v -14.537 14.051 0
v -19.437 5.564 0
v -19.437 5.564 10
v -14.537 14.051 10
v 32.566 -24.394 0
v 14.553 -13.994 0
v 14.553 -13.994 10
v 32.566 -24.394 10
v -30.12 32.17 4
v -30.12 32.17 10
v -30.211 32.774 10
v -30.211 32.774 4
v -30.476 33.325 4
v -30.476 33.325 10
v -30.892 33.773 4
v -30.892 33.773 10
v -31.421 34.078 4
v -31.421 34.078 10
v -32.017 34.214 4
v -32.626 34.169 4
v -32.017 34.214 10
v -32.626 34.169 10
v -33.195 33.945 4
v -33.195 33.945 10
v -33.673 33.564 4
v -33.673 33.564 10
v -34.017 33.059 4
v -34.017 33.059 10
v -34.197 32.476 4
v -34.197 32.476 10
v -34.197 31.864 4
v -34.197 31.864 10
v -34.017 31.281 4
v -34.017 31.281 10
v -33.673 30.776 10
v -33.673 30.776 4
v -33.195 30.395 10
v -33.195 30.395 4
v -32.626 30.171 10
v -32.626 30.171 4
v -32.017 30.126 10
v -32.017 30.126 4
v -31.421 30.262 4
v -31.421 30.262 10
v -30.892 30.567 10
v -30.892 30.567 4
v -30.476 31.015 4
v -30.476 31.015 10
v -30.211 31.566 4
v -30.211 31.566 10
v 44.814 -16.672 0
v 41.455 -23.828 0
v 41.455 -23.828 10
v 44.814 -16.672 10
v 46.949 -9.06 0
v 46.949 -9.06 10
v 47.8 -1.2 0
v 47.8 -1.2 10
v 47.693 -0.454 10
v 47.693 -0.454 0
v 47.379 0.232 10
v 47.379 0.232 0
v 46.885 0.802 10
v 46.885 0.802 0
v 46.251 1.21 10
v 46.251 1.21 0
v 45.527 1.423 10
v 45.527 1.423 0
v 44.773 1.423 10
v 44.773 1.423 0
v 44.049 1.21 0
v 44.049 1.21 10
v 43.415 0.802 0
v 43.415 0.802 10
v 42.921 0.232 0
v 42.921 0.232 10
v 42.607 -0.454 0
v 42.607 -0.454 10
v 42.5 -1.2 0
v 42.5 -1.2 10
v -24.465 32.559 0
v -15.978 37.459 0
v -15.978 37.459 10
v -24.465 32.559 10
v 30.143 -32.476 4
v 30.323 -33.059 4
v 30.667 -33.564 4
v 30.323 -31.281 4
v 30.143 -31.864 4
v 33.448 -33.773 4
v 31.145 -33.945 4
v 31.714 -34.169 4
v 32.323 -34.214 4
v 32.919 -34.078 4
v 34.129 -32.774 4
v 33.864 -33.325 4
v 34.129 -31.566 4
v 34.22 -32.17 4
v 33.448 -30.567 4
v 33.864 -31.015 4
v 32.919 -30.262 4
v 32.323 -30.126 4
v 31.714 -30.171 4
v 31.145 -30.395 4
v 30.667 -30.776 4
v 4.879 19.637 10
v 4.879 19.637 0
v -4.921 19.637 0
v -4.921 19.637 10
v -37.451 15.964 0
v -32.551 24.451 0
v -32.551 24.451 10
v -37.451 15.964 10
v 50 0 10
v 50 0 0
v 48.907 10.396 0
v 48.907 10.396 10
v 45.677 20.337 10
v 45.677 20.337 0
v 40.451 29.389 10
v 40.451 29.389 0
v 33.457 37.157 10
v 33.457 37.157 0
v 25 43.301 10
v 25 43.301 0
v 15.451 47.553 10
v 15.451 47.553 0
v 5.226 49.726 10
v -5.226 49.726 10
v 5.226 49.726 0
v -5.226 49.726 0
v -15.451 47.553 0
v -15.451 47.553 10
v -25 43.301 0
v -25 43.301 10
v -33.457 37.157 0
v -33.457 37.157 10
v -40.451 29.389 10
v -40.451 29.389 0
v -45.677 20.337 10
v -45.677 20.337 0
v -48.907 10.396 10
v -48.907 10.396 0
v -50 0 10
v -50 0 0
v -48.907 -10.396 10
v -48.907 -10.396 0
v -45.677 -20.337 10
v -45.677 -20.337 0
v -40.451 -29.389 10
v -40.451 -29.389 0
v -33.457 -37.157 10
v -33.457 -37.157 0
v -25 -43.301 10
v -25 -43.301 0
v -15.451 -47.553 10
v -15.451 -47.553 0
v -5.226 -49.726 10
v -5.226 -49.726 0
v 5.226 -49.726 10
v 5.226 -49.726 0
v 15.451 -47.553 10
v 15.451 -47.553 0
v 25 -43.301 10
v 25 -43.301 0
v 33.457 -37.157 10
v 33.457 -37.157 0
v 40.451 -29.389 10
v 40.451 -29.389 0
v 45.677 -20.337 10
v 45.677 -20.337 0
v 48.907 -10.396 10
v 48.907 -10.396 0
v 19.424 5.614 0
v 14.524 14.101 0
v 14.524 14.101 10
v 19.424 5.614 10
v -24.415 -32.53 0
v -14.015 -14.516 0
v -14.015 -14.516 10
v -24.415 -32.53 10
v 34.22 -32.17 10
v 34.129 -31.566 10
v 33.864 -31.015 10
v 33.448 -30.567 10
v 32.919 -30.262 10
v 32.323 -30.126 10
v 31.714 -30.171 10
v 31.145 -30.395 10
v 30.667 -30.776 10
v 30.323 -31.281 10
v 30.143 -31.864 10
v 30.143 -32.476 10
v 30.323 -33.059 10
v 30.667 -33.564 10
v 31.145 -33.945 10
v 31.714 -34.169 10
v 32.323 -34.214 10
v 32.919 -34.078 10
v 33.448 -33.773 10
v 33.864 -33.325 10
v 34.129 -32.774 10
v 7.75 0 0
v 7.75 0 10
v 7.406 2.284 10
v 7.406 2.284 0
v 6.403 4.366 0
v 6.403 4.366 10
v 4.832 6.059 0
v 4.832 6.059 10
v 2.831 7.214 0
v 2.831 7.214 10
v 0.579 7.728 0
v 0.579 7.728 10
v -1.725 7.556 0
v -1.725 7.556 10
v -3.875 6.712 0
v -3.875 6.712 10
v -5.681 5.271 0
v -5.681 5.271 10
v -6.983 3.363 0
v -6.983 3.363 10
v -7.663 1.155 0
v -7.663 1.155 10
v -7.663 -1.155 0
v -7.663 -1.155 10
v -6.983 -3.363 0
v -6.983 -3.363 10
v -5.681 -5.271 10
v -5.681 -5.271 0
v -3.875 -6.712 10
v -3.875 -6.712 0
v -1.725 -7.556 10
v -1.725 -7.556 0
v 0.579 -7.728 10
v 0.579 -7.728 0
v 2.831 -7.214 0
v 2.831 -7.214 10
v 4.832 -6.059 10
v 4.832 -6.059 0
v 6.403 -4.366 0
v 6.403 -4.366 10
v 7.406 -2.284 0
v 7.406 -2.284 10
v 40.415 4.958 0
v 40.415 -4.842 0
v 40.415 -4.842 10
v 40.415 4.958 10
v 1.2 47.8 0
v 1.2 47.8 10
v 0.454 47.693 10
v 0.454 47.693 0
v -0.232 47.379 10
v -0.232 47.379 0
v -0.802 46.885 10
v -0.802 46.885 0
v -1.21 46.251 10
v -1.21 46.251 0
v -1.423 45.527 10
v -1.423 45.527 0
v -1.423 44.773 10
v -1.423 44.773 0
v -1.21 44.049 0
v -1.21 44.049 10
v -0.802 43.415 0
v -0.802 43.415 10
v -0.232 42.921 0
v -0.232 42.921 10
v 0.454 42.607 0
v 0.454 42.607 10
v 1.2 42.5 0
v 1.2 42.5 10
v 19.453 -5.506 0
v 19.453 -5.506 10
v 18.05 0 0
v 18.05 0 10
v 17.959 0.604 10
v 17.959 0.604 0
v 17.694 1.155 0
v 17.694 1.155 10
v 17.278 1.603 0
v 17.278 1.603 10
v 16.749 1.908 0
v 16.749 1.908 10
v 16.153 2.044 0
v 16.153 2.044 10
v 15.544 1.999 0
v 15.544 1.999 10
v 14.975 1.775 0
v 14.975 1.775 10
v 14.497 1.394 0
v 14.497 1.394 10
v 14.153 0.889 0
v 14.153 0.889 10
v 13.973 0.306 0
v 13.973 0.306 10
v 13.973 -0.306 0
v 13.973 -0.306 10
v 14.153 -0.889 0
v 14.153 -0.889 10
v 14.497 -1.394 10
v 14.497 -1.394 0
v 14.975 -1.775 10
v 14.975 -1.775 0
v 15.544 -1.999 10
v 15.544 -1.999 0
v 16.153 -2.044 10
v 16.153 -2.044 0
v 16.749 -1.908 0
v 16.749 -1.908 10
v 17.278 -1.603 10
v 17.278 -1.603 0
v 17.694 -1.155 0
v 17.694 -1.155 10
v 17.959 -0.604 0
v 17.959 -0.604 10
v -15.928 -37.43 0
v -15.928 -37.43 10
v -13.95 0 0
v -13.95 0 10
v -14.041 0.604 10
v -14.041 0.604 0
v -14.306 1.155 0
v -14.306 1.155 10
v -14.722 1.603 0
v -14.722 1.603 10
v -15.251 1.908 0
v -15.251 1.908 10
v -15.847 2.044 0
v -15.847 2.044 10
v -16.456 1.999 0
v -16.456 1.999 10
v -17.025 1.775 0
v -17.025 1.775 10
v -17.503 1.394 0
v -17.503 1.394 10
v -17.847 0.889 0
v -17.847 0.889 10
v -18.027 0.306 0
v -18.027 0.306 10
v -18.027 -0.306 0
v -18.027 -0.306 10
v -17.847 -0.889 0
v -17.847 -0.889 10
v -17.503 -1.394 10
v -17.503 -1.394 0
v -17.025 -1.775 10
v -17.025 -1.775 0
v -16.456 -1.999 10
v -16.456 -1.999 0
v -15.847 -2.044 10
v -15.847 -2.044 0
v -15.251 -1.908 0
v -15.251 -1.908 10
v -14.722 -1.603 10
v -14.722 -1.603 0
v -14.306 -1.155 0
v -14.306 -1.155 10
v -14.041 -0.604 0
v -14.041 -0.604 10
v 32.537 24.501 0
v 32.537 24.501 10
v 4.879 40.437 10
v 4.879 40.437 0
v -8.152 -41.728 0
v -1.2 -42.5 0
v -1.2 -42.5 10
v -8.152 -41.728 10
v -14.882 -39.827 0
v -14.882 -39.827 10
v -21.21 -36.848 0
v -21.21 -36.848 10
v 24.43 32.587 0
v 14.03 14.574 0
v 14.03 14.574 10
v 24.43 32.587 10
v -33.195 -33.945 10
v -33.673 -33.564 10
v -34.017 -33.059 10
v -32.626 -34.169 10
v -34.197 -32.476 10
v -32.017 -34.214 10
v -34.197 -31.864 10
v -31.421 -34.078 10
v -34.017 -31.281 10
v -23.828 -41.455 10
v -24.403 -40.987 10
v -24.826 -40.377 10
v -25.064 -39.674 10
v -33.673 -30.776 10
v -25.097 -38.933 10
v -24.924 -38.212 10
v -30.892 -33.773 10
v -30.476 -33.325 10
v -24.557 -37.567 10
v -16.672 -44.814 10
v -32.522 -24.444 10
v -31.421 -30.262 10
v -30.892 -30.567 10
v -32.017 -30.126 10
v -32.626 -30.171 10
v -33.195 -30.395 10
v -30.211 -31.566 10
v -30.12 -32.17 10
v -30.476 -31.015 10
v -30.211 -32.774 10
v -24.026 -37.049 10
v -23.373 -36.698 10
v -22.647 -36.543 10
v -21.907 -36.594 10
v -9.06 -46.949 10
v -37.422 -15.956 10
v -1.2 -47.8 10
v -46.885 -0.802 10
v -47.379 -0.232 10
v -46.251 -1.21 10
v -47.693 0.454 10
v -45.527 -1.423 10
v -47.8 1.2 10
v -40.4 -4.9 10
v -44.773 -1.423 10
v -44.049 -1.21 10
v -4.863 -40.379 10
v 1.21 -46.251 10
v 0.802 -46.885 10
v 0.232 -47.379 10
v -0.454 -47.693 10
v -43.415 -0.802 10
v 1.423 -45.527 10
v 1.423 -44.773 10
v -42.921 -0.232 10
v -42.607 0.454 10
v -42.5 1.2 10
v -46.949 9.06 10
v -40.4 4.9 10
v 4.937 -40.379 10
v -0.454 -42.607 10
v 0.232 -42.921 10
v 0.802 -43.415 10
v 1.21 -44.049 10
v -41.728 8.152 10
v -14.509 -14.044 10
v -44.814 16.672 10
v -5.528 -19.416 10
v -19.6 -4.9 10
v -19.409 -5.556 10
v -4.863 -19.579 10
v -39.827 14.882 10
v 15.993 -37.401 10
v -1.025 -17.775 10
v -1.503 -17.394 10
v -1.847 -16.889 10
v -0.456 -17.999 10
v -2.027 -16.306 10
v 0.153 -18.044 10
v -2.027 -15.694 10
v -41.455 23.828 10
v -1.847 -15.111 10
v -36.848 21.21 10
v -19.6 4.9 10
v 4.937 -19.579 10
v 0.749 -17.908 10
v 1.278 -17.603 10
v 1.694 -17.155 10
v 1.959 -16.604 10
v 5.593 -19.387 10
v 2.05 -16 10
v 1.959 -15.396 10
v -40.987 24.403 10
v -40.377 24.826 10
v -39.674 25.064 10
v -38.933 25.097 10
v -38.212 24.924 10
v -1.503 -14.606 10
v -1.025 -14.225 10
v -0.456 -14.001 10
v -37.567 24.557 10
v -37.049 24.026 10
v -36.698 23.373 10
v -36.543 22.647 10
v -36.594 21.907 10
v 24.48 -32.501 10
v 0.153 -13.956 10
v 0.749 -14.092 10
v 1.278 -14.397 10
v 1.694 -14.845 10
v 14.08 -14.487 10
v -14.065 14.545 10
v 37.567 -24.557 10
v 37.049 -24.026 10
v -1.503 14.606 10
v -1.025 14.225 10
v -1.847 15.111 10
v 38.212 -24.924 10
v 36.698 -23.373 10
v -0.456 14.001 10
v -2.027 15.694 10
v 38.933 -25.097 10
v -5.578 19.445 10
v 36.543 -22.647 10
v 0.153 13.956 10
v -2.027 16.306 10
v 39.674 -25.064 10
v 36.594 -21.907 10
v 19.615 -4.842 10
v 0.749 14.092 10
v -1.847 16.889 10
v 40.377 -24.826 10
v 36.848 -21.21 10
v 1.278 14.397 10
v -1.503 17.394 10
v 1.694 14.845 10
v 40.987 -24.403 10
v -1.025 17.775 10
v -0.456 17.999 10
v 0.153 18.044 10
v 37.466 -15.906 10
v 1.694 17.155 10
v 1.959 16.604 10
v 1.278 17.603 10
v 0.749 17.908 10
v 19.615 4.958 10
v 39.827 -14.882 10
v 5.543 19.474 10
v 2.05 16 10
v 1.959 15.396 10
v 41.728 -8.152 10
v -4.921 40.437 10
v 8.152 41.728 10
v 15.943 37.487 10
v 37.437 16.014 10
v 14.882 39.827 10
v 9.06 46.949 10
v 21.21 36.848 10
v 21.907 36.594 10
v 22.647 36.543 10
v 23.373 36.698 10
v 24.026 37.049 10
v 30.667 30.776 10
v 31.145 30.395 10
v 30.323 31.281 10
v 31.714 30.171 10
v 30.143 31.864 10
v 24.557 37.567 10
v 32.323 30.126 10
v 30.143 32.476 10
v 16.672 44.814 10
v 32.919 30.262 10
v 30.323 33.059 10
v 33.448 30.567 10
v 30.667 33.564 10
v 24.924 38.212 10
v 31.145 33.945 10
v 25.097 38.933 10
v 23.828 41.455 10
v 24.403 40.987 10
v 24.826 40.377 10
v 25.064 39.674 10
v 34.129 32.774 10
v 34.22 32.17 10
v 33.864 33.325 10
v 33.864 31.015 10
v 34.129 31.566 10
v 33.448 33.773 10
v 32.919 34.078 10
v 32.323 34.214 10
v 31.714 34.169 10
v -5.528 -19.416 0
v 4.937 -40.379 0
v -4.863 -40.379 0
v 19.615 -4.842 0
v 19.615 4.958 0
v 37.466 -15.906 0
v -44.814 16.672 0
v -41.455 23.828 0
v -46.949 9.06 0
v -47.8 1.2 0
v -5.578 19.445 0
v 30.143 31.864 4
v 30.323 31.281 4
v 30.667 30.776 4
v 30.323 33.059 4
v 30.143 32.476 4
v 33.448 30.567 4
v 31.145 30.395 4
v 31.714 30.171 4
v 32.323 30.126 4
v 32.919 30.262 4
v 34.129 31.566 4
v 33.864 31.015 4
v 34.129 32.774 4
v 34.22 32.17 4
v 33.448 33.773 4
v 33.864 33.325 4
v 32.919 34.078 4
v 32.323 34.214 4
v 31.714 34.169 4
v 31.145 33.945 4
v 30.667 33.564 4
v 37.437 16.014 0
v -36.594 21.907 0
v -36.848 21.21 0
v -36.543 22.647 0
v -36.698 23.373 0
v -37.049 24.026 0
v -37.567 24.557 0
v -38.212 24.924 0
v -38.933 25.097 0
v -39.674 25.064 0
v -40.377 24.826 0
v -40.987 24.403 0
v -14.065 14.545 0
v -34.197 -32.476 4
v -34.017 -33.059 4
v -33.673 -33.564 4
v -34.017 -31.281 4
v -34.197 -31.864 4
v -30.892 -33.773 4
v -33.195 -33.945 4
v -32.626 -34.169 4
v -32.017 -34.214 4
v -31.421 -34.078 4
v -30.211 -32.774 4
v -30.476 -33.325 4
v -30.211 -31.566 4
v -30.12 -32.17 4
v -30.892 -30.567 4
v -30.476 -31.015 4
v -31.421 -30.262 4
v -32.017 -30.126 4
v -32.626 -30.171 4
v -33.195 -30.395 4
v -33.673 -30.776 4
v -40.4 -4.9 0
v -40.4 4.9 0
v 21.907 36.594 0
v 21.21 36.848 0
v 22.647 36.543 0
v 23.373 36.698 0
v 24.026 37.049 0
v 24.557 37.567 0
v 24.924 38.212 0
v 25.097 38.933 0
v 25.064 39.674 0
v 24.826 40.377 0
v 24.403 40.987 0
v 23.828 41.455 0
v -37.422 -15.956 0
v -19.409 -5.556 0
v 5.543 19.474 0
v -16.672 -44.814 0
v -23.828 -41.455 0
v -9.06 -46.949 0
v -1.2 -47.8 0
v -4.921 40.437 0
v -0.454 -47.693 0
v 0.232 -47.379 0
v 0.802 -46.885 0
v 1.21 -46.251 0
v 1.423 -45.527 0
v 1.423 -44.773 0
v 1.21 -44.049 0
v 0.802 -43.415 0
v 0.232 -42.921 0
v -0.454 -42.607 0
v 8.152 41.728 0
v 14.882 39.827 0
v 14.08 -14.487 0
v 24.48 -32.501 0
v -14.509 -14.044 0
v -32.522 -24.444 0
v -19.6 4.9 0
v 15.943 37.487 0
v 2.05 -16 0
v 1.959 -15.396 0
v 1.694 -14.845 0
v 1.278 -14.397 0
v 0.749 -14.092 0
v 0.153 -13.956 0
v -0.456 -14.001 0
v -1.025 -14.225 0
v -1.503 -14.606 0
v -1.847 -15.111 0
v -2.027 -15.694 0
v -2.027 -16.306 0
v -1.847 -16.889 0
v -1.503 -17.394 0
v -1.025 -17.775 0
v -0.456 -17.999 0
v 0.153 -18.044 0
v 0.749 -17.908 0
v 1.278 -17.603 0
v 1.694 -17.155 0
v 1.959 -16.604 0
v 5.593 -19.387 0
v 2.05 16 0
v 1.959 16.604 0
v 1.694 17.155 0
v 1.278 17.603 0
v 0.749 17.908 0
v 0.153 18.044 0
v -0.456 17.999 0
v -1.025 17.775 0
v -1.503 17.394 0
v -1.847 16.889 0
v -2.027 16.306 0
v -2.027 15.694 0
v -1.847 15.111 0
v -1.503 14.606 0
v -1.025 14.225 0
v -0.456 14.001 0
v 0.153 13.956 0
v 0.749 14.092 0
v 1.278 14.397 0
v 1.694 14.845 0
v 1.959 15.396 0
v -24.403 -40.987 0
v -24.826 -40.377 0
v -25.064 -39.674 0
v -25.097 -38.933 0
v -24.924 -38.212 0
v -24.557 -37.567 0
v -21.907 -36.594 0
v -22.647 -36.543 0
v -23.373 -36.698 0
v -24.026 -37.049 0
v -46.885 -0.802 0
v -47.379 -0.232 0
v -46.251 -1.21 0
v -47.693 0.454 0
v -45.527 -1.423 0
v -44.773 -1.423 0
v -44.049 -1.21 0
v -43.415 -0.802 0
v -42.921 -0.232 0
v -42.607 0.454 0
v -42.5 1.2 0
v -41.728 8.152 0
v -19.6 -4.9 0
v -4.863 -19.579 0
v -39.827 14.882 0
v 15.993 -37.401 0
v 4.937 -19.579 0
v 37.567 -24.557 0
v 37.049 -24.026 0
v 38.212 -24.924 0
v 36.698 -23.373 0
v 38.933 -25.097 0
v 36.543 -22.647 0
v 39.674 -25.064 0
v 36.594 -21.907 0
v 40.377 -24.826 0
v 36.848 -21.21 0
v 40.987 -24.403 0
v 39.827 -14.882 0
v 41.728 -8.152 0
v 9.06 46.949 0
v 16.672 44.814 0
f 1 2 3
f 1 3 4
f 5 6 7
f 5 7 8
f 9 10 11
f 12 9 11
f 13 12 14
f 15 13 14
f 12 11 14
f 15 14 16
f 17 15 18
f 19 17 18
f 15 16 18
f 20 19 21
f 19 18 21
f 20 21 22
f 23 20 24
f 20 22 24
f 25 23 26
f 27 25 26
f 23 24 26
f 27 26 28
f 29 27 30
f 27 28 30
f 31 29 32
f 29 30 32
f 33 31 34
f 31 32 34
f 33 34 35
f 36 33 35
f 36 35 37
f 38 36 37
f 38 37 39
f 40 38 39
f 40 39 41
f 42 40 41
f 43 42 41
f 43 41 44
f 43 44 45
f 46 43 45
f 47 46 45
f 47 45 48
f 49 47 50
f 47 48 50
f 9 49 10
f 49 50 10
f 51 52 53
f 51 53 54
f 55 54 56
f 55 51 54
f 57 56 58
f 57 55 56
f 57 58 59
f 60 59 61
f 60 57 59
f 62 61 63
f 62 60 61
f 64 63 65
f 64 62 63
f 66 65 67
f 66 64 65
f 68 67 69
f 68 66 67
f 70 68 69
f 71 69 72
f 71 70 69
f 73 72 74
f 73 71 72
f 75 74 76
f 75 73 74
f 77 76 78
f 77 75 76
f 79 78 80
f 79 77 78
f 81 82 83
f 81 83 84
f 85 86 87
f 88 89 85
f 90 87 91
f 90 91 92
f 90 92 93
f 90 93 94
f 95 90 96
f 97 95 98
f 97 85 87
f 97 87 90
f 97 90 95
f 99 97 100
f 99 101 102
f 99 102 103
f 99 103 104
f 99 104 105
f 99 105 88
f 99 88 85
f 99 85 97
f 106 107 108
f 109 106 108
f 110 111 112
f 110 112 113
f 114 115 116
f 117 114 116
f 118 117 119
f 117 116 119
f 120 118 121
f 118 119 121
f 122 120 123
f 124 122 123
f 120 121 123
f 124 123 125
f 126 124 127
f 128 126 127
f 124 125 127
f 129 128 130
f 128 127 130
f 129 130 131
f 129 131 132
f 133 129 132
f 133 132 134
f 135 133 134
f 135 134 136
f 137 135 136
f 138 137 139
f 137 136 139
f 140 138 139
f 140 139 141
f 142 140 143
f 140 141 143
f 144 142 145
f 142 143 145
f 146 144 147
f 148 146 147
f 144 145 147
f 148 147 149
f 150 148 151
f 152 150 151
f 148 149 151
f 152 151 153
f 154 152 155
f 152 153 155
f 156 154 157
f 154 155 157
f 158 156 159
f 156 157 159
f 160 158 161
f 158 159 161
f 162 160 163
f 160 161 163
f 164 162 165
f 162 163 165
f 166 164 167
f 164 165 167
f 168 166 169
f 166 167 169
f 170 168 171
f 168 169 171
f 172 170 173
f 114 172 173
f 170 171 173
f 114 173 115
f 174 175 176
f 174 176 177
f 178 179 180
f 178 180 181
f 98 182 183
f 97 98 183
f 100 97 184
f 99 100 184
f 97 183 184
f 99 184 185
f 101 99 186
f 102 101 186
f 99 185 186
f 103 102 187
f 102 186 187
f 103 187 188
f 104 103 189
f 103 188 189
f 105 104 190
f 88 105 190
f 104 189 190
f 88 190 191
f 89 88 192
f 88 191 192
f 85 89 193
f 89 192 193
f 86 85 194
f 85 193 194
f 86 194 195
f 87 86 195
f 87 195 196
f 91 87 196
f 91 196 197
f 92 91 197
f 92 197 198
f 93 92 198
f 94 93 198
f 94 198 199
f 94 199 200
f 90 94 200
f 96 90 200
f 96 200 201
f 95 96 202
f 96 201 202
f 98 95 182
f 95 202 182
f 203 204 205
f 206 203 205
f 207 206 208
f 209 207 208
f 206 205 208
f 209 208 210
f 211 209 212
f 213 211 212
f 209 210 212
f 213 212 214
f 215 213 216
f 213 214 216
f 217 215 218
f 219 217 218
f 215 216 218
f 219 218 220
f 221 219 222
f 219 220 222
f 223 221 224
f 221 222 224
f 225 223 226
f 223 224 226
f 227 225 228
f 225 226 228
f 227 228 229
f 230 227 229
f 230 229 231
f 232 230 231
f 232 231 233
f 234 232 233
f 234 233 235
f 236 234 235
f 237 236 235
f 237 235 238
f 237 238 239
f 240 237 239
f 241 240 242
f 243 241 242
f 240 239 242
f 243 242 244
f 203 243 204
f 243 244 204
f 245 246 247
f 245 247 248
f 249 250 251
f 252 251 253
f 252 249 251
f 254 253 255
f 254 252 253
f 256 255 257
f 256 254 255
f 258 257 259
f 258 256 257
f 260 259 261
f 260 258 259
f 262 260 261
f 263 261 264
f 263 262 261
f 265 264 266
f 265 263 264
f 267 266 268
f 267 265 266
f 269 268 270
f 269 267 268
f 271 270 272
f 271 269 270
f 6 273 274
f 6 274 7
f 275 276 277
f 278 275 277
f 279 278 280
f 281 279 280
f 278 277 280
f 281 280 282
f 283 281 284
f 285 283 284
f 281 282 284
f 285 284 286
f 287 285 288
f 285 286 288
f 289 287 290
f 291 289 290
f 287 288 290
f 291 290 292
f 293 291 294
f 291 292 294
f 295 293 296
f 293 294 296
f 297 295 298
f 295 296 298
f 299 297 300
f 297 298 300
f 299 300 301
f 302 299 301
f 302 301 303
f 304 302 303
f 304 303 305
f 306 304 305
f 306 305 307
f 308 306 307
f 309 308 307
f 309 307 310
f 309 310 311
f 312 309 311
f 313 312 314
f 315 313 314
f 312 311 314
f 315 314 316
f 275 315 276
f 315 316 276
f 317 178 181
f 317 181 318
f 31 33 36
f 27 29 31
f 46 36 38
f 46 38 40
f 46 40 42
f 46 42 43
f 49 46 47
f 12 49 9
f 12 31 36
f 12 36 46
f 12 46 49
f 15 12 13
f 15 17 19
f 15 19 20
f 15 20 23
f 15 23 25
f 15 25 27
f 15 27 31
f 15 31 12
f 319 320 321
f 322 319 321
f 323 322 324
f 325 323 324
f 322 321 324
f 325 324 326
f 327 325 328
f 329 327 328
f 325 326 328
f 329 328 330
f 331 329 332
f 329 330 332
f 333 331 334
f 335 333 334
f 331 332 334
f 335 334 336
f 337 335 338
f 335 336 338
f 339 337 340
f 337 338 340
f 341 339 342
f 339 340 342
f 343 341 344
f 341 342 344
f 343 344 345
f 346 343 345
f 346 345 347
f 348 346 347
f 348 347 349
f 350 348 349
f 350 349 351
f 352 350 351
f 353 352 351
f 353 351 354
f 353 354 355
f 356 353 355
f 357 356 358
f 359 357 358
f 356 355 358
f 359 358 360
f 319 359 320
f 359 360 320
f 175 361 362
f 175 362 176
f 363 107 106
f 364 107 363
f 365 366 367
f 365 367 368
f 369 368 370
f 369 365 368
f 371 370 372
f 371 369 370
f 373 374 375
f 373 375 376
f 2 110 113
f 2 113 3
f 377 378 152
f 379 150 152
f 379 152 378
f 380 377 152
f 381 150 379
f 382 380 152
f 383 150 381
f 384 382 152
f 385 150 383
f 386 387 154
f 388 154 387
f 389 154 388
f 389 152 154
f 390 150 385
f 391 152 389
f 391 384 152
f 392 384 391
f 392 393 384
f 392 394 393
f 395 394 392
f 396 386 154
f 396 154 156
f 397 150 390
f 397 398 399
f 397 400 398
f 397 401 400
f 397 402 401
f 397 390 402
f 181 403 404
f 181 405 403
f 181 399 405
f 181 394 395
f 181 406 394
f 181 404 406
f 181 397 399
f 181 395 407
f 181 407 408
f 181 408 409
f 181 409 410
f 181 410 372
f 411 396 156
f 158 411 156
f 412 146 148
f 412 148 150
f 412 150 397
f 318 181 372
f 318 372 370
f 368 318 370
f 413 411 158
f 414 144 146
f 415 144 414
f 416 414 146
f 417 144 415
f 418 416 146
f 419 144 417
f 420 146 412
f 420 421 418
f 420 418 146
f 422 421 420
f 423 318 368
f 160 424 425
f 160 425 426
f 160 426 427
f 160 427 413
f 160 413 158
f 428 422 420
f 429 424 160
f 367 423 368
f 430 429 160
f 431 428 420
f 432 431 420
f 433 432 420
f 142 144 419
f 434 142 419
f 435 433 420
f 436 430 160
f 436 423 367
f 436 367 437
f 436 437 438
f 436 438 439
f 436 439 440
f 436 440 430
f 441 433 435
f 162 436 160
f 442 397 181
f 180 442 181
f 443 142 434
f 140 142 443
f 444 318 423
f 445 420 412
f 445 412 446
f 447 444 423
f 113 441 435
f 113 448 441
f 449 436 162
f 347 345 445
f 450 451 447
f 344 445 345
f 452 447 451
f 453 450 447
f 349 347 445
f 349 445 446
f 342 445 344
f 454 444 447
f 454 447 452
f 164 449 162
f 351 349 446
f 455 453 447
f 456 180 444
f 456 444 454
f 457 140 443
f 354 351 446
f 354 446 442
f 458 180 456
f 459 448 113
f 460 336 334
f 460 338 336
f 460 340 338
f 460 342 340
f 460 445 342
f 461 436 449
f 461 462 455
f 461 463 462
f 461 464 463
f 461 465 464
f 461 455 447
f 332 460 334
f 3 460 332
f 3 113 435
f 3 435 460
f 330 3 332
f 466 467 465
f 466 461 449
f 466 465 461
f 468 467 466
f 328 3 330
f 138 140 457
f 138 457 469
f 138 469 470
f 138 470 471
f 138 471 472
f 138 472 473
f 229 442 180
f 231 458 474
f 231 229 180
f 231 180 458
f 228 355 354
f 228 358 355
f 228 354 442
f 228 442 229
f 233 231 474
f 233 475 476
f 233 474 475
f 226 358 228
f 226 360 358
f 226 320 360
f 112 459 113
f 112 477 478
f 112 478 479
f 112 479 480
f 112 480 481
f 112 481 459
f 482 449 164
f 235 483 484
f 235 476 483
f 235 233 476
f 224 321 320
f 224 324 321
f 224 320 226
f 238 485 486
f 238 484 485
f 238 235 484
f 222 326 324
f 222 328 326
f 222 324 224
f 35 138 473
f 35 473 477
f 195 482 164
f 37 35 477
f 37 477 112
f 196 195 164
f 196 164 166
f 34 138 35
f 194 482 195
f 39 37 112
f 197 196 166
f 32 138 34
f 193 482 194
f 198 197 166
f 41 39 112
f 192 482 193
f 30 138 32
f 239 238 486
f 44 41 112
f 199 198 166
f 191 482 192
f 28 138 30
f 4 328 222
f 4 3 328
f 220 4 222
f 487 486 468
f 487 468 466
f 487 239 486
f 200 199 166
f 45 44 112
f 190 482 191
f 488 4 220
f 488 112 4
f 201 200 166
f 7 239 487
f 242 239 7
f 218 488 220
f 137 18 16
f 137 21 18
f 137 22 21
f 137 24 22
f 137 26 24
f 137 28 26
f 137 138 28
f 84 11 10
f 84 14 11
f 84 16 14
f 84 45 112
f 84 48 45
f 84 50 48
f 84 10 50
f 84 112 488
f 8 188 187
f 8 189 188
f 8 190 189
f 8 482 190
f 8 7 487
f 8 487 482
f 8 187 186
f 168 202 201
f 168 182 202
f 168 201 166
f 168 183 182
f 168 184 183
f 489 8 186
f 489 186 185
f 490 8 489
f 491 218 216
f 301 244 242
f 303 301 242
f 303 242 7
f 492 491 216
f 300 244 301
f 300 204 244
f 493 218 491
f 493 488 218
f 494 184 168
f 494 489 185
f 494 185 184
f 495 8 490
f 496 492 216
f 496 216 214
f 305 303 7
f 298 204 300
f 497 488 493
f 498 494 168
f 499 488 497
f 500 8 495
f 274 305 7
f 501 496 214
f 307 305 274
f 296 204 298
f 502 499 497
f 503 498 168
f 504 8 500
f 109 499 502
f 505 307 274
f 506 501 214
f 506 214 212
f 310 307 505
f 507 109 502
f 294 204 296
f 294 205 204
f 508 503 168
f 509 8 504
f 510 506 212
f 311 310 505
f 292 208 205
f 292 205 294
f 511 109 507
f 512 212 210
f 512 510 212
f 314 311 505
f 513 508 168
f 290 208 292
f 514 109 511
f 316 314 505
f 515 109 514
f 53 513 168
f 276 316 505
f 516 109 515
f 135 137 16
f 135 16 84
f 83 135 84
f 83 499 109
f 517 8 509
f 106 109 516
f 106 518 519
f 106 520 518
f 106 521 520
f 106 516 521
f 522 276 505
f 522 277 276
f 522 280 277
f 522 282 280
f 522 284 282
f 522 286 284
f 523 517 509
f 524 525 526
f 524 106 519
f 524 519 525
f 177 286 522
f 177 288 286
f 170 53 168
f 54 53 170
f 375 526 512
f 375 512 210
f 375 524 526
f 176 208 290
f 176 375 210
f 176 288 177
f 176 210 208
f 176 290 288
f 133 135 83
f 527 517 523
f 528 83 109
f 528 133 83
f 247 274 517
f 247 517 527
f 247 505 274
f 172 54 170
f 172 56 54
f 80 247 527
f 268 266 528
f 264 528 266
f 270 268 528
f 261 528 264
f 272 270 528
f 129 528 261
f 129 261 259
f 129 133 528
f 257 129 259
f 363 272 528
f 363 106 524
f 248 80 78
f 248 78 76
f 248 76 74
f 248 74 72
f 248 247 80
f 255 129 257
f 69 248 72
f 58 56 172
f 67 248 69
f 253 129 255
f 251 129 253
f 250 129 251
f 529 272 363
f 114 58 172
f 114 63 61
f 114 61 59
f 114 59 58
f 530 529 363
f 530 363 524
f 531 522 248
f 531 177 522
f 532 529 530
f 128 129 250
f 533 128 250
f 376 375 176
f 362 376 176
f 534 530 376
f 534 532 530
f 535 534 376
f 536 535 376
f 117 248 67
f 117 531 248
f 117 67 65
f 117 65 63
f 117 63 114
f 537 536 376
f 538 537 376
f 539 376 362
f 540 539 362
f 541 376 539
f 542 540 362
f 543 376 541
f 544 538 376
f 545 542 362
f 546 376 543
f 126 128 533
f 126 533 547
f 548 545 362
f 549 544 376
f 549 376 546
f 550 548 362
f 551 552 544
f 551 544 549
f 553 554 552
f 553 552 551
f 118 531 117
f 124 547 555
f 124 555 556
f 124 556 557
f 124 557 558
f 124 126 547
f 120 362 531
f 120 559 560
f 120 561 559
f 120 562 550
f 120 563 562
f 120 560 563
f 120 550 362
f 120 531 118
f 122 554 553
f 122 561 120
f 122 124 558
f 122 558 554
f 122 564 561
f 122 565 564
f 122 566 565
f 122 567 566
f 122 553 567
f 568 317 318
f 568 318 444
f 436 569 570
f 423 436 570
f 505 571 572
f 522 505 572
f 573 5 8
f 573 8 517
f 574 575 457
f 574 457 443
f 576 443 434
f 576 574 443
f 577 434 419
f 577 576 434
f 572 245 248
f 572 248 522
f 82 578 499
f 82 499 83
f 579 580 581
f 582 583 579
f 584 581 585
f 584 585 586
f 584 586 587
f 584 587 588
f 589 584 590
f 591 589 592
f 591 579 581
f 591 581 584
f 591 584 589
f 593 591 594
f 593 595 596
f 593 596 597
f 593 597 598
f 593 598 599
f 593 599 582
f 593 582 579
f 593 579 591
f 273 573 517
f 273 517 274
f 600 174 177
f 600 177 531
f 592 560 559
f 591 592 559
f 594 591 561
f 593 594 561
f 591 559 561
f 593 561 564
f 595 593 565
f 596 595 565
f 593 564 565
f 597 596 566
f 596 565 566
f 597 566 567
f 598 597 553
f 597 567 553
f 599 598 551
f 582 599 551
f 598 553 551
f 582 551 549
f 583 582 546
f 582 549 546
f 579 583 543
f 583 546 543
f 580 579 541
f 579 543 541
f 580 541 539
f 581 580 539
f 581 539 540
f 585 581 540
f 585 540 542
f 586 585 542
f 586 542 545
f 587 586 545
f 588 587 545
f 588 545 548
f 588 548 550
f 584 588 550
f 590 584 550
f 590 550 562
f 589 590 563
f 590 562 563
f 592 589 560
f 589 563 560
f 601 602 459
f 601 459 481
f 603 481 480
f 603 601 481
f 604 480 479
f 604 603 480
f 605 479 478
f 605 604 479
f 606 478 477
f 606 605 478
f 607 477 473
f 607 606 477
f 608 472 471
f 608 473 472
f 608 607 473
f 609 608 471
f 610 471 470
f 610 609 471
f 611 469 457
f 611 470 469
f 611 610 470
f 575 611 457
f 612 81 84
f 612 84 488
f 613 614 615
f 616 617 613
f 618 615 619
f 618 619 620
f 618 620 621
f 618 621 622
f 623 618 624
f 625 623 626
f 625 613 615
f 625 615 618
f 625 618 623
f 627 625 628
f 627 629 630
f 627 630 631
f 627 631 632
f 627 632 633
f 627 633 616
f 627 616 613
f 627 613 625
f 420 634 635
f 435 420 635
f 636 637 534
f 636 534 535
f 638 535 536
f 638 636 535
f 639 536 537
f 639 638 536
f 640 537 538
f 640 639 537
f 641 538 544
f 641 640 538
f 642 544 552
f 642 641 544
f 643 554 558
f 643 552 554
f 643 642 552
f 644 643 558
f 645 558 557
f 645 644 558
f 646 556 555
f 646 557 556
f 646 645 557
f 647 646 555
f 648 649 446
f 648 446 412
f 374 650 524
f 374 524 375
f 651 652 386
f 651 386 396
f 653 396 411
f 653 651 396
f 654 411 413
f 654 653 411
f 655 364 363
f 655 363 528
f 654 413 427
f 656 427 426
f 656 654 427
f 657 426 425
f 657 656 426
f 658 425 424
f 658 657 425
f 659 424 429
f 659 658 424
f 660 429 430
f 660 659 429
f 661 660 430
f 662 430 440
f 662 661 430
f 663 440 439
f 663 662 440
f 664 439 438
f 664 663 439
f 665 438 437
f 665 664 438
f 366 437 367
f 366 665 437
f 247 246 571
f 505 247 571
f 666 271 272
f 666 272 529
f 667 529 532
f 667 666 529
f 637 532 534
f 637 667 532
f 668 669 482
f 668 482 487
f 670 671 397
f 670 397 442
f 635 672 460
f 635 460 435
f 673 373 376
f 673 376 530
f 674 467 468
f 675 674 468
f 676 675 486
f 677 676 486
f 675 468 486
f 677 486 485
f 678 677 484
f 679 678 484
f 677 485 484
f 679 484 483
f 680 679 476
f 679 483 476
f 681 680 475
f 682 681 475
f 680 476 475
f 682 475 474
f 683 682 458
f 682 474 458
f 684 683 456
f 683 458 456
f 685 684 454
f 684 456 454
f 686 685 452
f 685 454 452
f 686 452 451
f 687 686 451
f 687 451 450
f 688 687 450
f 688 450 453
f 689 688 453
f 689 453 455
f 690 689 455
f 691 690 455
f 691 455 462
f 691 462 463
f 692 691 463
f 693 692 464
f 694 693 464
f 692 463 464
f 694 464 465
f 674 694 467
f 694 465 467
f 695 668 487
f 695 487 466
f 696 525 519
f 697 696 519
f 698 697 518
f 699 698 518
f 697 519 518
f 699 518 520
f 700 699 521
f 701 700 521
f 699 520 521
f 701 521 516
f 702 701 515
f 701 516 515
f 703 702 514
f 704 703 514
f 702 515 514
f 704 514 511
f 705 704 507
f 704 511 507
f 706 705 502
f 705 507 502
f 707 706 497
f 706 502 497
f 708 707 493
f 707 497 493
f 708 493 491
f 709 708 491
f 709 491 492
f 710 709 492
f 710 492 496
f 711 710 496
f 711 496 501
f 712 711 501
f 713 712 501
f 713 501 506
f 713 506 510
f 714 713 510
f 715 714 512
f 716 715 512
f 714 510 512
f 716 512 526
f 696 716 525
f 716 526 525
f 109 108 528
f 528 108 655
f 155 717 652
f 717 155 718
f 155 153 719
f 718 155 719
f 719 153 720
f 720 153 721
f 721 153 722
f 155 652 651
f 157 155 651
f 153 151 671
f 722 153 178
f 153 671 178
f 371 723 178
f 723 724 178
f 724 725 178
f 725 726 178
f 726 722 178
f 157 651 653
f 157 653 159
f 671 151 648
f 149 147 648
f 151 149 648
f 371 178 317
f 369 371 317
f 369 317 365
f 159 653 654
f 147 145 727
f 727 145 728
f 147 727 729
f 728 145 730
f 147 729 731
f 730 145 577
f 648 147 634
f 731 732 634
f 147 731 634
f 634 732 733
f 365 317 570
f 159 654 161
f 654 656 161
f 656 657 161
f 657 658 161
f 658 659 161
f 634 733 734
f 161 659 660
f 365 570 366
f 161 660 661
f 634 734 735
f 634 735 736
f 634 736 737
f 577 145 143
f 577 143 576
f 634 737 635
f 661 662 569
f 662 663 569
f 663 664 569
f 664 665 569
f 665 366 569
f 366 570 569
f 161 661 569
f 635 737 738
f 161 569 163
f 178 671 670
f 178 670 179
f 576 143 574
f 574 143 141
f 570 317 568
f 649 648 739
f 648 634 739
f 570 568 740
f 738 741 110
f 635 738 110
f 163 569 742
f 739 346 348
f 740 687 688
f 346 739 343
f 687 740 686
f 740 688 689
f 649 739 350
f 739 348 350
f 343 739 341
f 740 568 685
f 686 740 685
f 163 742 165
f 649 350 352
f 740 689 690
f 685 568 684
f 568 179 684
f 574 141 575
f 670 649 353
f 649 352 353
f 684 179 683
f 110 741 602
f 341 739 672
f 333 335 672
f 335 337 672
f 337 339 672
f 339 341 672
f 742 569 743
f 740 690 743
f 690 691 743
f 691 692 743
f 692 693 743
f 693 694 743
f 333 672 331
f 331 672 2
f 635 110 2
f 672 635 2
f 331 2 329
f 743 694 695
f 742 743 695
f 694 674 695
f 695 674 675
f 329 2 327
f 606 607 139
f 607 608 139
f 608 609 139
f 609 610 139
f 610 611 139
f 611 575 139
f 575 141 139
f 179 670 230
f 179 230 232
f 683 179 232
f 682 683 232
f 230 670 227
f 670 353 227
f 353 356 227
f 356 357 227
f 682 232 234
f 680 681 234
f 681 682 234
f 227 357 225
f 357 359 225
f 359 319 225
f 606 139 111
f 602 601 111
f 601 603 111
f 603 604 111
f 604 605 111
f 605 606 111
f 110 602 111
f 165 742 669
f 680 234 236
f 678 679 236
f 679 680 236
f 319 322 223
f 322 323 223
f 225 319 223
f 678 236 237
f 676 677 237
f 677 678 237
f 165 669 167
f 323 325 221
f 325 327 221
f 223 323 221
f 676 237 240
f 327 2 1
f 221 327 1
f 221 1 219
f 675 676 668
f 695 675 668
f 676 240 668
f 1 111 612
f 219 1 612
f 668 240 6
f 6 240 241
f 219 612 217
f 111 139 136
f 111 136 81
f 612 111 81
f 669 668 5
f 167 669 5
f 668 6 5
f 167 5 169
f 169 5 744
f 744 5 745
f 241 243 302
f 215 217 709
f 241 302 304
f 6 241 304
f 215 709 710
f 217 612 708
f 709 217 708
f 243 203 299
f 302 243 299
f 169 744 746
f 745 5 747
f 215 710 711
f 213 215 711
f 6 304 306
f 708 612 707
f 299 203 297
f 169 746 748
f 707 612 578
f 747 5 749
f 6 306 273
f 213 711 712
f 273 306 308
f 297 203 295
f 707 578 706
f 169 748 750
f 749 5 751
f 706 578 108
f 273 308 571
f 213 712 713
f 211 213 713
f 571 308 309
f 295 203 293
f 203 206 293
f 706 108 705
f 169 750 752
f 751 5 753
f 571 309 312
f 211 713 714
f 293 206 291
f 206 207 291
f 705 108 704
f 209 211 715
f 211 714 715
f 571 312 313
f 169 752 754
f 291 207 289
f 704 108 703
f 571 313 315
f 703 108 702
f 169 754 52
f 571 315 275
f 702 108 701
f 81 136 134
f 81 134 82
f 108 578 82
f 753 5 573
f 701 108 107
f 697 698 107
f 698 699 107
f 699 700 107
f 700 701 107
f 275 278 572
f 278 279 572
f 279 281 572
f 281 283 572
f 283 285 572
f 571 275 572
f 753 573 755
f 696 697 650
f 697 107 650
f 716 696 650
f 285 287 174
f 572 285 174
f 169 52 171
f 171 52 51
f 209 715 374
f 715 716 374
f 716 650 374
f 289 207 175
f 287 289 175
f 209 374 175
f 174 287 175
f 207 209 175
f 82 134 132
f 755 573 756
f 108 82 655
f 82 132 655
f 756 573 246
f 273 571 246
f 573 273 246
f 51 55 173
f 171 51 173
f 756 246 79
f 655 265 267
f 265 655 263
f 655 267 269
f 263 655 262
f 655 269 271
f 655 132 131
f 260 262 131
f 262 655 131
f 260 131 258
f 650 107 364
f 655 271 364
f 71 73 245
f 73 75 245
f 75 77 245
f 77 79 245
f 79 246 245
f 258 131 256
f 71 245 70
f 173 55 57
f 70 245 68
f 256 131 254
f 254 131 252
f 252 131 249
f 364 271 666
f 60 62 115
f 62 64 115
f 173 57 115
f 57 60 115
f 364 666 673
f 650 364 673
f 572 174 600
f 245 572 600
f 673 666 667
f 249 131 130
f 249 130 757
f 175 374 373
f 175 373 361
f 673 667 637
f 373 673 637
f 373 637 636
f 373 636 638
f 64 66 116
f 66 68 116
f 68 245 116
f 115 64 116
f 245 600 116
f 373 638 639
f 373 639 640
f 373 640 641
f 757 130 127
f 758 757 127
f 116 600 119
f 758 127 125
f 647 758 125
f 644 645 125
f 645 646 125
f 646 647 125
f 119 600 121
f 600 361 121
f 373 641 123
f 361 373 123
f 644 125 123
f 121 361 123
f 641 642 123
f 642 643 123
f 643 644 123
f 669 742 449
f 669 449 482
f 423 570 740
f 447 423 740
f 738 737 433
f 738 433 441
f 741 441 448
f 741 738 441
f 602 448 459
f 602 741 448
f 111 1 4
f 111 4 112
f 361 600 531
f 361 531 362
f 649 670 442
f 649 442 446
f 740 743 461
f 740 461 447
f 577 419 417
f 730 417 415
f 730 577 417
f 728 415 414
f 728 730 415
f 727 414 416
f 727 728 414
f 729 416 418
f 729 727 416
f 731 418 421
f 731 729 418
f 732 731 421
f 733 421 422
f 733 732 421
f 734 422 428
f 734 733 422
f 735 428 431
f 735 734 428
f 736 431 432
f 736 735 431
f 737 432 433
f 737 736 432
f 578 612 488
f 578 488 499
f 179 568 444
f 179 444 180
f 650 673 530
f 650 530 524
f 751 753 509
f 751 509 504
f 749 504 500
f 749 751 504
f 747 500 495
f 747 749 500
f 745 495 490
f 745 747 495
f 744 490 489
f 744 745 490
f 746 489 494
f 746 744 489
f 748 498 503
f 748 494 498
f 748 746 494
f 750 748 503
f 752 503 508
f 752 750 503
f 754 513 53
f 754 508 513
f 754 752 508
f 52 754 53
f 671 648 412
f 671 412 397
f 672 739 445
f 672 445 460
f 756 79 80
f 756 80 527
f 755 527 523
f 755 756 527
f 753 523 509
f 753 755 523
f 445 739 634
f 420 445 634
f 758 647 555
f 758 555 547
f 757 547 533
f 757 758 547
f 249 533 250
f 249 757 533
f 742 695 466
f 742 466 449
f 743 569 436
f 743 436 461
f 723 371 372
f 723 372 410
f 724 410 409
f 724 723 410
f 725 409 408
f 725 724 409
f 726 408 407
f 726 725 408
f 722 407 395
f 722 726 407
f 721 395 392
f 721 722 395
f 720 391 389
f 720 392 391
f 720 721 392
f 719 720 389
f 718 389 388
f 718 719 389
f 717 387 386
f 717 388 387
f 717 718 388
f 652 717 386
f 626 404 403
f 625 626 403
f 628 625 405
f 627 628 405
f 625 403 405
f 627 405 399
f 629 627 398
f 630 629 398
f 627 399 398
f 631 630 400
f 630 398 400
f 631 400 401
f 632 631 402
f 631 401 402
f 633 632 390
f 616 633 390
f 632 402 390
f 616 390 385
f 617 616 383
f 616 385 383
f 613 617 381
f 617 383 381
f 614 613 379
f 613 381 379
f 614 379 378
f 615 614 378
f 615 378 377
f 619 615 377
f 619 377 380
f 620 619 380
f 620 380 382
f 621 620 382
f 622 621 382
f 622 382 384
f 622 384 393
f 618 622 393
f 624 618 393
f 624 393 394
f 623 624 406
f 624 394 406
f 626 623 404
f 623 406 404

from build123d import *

# Parameters (mm, degrees)
CROQUIS2_R              = 50
SALIENTE_EXTRUIR1_DEPTH = 10
CROQUIS1_W              = 9.8
CROQUIS1_H              = 20.8
CROQUIS1_W_2            = 20.8
CROQUIS1_H_2            = 9.8
CORTAR_EXTRUIR3_DEPTH   = 72.414284285
CROQUIS4_R              = 7.75
CORTAR_EXTRUIR4_DEPTH   = 10
CROQUIS5_R              = 2.05
CORTAR_EXTRUIR5_DEPTH   = 10
CROQUIS6_R              = 2.05
CORTAR_EXTRUIR6_DEPTH   = 6


with BuildPart() as part:
    # Croquis2 → Saliente-Extruir1 (new body)
    with BuildSketch(Plane(origin=(0, 0, 0), x_dir=(0, 1, 0), z_dir=(0, 0, 1))):
        with Locations(Location((0, 0, 0), (0, 0, 270))):
            Circle(CROQUIS2_R)
    extrude(amount=SALIENTE_EXTRUIR1_DEPTH)

    # Croquis1 → Cortar-Extruir3 (cut, through all)
    with BuildSketch(Plane(origin=(0, 0, 0), x_dir=(0, 1, 0), z_dir=(0, 0, 1))):
        Polygon((15.964211374, 37.450825203), (5.564211374, 19.437496804), (14.051260331, 14.537496804), (24.451260331, 32.550825203), align=None)
        with Locations((0, 30)):
            Rectangle(CROQUIS1_W, CROQUIS1_H)
        Polygon((32.558561056, 24.464659221), (14.545232657, 14.064659221), (19.445232657, 5.577610264), (37.458561056, 15.977610264), align=None)
        with Locations((30.036606449, 0.021134743)):
            Rectangle(CROQUIS1_W_2, CROQUIS1_H_2)
        Polygon((37.487431651, -15.943076631), (19.474103253, -5.543076631), (14.574103253, -14.030125588), (32.587431651, -24.430125588), align=None)
        Polygon((24.50126567, -32.537426313), (14.10126567, -14.524097914), (5.614216713, -19.424097914), (16.014216713, -37.437426313), align=None)
        with Locations((0.057741191, -30.015471706)):
            Rectangle(CROQUIS1_W, CROQUIS1_H)
        Polygon((-15.906470183, -37.466296909), (-5.506470183, -19.45296851), (-13.99351914, -14.55296851), (-24.39351914, -32.566296909), align=None)
        Polygon((-32.500819864, -24.480130927), (-14.487491466, -14.080130927), (-19.387491466, -5.59308197), (-37.400819864, -15.99308197), align=None)
        with Locations((-29.978865257, -0.036606449)):
            Rectangle(CROQUIS1_W_2, CROQUIS1_H_2)
        Polygon((-37.42969046, 15.927604926), (-19.416362061, 5.527604926), (-14.516362061, 14.014653883), (-32.52969046, 24.414653883), align=None)
        Polygon((-24.443524479, 32.521954607), (-14.043524479, 14.508626209), (-5.556475521, 19.408626209), (-15.956475521, 37.421954607), align=None)
        with BuildLine():
            ThreePointArc((47.8, -1.200469891), (45.15, 1.449530109), (42.5, -1.200469891))
            ThreePointArc((42.5, -1.200469891), (40.916298266, -11.556282456), (36.848431426, -21.210474521))
            ThreePointArc((36.848431426, -21.210474521), (37.876754986, -24.76308434), (41.454989786, -23.827818822))
            ThreePointArc((41.454989786, -23.827818822), (46.039249889, -12.910019273), (47.8, -1.200469891))
        make_face()
        with BuildLine():
            ThreePointArc((1.200469891, 47.8), (-1.449530109, 45.15), (1.200469891, 42.5))
            ThreePointArc((1.200469891, 42.5), (11.556282456, 40.916298266), (21.210474521, 36.848431426))
            ThreePointArc((21.210474521, 36.848431426), (24.76308434, 37.876754986), (23.827818822, 41.454989786))
            ThreePointArc((23.827818822, 41.454989786), (12.910019273, 46.039249889), (1.200469891, 47.8))
        make_face()
        with BuildLine():
            ThreePointArc((-1.200469891, -47.8), (1.449530109, -45.15), (-1.200469891, -42.5))
            ThreePointArc((-1.200469891, -42.5), (-11.556282456, -40.916298266), (-21.210474521, -36.848431426))
            ThreePointArc((-21.210474521, -36.848431426), (-24.76308434, -37.876754986), (-23.827818822, -41.454989786))
            ThreePointArc((-23.827818822, -41.454989786), (-12.910019273, -46.039249889), (-1.200469891, -47.8))
        make_face()
        with BuildLine():
            ThreePointArc((-47.8, 1.200469891), (-45.15, -1.449530109), (-42.5, 1.200469891))
            ThreePointArc((-42.5, 1.200469891), (-40.916298266, 11.556282456), (-36.848431426, 21.210474521))
            ThreePointArc((-36.848431426, 21.210474521), (-37.876754986, 24.76308434), (-41.454989786, 23.827818822))
            ThreePointArc((-41.454989786, 23.827818822), (-46.039249889, 12.910019273), (-47.8, 1.200469891))
        make_face()
    extrude(amount=CORTAR_EXTRUIR3_DEPTH, mode=Mode.SUBTRACT)

    # Croquis4 → Cortar-Extruir4 (cut)
    with BuildSketch(Plane.XY.offset(10)):
        Circle(CROQUIS4_R)
    extrude(amount=-CORTAR_EXTRUIR4_DEPTH, mode=Mode.SUBTRACT)

    # Croquis5 → Cortar-Extruir5 (cut)
    with BuildSketch(Plane.XY.offset(10)):
        with Locations((0, 16)):
            Circle(CROQUIS5_R)
        with Locations((16, 0)):
            Circle(CROQUIS5_R)
        with Locations((0, -16)):
            Circle(CROQUIS5_R)
        with Locations((-16, 0)):
            Circle(CROQUIS5_R)
    extrude(amount=-CORTAR_EXTRUIR5_DEPTH, mode=Mode.SUBTRACT)

    # Croquis6 → Cortar-Extruir6 (cut)
    with BuildSketch(Plane.XY.offset(10)):
        with Locations((-32.17, 32.17)):
            Circle(CROQUIS6_R)
        with Locations((32.17, 32.17)):
            Circle(CROQUIS6_R)
        with Locations((32.17, -32.17)):
            Circle(CROQUIS6_R)
        with Locations((-32.17, -32.17)):
            Circle(CROQUIS6_R)
    extrude(amount=-CORTAR_EXTRUIR6_DEPTH, mode=Mode.SUBTRACT)


solid = part.part
